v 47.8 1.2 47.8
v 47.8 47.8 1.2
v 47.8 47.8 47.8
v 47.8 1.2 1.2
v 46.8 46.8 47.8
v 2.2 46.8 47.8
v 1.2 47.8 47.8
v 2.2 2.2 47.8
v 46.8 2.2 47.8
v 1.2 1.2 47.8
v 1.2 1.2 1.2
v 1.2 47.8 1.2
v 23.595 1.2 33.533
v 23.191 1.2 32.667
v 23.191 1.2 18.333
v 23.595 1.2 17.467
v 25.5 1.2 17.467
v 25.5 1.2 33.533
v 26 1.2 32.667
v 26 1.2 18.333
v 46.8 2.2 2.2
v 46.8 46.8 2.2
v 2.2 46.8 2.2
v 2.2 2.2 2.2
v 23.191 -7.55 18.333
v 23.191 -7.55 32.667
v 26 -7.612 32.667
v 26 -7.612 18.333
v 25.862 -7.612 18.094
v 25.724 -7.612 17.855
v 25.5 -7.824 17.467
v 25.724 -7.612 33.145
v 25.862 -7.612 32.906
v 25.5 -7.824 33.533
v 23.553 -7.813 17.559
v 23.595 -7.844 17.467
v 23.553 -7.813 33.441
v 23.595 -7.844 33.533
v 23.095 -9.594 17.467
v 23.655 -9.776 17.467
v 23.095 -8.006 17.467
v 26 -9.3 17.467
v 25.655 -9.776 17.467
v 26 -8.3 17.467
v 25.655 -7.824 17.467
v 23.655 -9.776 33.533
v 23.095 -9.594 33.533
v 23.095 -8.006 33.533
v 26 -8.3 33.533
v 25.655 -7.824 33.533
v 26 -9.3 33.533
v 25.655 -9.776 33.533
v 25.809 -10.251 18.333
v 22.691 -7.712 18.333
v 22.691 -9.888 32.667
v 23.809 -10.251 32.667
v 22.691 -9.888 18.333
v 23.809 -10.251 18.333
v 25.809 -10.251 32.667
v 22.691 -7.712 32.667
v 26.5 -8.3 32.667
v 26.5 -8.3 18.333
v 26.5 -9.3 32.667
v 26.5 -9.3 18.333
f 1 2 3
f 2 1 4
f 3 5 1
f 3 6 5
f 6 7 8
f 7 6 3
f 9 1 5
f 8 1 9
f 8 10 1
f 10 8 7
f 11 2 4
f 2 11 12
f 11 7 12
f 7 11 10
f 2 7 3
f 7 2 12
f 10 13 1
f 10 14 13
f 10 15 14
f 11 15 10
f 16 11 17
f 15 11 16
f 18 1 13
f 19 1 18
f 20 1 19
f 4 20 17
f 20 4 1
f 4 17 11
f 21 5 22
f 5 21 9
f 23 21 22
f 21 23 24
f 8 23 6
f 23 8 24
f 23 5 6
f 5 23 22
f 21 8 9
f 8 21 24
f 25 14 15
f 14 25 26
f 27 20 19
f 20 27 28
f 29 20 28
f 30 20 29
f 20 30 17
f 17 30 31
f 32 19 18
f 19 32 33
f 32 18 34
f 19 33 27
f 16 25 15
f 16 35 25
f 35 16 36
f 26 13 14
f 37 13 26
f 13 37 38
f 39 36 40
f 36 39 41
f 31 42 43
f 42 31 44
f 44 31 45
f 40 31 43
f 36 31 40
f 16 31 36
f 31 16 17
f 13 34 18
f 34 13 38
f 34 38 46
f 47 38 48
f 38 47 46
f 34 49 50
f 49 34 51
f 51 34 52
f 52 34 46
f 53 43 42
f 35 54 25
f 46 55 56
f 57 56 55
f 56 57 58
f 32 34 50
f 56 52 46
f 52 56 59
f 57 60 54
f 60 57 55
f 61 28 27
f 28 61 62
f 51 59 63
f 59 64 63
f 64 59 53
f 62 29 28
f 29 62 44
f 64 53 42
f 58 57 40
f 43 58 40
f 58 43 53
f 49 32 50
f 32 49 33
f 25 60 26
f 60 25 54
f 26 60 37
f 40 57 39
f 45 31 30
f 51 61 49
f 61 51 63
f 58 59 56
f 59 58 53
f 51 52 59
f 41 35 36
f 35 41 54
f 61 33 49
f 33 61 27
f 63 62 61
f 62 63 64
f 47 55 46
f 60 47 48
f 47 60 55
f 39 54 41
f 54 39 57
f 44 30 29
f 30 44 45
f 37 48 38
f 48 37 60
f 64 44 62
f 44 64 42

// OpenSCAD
module cell(w,h,d,c,c1) {
  difference() {
    color([1,.9,.7,1])cube([w,h,d]);
    translate([c,c1,c]) cube([w-2*c,h-c-c1,d-2*c]);
    translate([c,-.1,c+c1]) cube([w-2*c,h-c-.1,d-2*c-c1]);
  }
}

module box(w,h,d,c,handle,ts) {
  color([.4,.1,.1,.9]) difference() {
    cube([w,h,d]);
    translate([c,c,c]) cube([w-2*c,h-2*c,d-c+.1]);
  }
  color([.4,.1,.1,.9]) translate([w/2,-handle[1],c+h/2]) {
    translate([0, 5,0]) minkowski() {
      cube(handle, center=true);
      sphere(c);
    };
    minkowski() {
      cube([handle[0]*2,handle[0],handle[2]], center=true);
      sphere(c);
    };
  }
}

module male(step,h,d) {
    union() {
        translate([step/2,0,-d/2]) difference() {
            translate([0,0,0]) rotate([-90,0,0]) cylinder(d=d,h=h,$fn=6);
            translate([-d/2,-1,-d]) cube([d,h+2,d]);
            translate([0,h-d,0]) sphere(d/4);
        }
    }
}

module female(step,h,d) {
    difference() {
        cube([step,h,d/2-c]);
        dist=.15;
        translate([0,-dist-1,d/2]) minkowski() {
            male(step,h+2,d+dist);
            sphere(dist);
        }
    }
}

module connectors(w,h,d,c,size) {
  difference(){
    union() {
      for (y = [0:30:h]) {
        translate([c,0,y+30]) rotate([0,90,0]) male(30,d,6);
        translate([w+c,0,y+30]) rotate([0,90,0]) female(30,d,6.2);
        }
    }
    translate([-d,-c,h+c]) cube([w+2*c+2*d,d+2*c,h+2*c]);
  }
  difference() {
      union(){
          for (x = [0:30:w]) {
            translate([x,0,c]) male(30,d,6);
            translate([x,0,h+c]) female(30,d,6.2);
          }
      }
      translate([w+2*c,-c,-d]) cube([w+2*c,d+2*c,h+2*c+2*d]);
  }
}

module rack(size, w, h, d, c, c1) {
  for (x = [0:size[0]-1]) {
    for (y = [0:size[1]-1]) {
      translate([x*(w-c),0,y*(h-c)]) cell(w,d,h,c,c1);
    }
  }
  connectors(size[0]*(w-c),size[1]*(h-c),d,c,size);
}

module bottom(w,d,c) {
    thick=6.2;
  difference() {
      translate([0,0,-thick/2+c-s]) union(){
          for (x = [0:30:w]) {
            translate([x,0,0]) female(30,d,thick);
          }
      }
      translate([w-2*c,-c,-d]) cube([w+2*c,d+2*c,h+2*c+2*d]);
  }
  translate([0,-d,-thick/2-s]) cube([w,2*d,c]);
}

w = 49;
h = 49;
d = 49;
c = 1;
c1 = .5;
s = .2;

//rack([4,3],w,h,d,c,c1);
translate([c+s,c+s,c+s]) box(w-2*c-2*s,d-2*c-2*s,h-2*c-2*s,c,[1,10,h/3-2*c],6);
//bottom((w)*4,d,c);
